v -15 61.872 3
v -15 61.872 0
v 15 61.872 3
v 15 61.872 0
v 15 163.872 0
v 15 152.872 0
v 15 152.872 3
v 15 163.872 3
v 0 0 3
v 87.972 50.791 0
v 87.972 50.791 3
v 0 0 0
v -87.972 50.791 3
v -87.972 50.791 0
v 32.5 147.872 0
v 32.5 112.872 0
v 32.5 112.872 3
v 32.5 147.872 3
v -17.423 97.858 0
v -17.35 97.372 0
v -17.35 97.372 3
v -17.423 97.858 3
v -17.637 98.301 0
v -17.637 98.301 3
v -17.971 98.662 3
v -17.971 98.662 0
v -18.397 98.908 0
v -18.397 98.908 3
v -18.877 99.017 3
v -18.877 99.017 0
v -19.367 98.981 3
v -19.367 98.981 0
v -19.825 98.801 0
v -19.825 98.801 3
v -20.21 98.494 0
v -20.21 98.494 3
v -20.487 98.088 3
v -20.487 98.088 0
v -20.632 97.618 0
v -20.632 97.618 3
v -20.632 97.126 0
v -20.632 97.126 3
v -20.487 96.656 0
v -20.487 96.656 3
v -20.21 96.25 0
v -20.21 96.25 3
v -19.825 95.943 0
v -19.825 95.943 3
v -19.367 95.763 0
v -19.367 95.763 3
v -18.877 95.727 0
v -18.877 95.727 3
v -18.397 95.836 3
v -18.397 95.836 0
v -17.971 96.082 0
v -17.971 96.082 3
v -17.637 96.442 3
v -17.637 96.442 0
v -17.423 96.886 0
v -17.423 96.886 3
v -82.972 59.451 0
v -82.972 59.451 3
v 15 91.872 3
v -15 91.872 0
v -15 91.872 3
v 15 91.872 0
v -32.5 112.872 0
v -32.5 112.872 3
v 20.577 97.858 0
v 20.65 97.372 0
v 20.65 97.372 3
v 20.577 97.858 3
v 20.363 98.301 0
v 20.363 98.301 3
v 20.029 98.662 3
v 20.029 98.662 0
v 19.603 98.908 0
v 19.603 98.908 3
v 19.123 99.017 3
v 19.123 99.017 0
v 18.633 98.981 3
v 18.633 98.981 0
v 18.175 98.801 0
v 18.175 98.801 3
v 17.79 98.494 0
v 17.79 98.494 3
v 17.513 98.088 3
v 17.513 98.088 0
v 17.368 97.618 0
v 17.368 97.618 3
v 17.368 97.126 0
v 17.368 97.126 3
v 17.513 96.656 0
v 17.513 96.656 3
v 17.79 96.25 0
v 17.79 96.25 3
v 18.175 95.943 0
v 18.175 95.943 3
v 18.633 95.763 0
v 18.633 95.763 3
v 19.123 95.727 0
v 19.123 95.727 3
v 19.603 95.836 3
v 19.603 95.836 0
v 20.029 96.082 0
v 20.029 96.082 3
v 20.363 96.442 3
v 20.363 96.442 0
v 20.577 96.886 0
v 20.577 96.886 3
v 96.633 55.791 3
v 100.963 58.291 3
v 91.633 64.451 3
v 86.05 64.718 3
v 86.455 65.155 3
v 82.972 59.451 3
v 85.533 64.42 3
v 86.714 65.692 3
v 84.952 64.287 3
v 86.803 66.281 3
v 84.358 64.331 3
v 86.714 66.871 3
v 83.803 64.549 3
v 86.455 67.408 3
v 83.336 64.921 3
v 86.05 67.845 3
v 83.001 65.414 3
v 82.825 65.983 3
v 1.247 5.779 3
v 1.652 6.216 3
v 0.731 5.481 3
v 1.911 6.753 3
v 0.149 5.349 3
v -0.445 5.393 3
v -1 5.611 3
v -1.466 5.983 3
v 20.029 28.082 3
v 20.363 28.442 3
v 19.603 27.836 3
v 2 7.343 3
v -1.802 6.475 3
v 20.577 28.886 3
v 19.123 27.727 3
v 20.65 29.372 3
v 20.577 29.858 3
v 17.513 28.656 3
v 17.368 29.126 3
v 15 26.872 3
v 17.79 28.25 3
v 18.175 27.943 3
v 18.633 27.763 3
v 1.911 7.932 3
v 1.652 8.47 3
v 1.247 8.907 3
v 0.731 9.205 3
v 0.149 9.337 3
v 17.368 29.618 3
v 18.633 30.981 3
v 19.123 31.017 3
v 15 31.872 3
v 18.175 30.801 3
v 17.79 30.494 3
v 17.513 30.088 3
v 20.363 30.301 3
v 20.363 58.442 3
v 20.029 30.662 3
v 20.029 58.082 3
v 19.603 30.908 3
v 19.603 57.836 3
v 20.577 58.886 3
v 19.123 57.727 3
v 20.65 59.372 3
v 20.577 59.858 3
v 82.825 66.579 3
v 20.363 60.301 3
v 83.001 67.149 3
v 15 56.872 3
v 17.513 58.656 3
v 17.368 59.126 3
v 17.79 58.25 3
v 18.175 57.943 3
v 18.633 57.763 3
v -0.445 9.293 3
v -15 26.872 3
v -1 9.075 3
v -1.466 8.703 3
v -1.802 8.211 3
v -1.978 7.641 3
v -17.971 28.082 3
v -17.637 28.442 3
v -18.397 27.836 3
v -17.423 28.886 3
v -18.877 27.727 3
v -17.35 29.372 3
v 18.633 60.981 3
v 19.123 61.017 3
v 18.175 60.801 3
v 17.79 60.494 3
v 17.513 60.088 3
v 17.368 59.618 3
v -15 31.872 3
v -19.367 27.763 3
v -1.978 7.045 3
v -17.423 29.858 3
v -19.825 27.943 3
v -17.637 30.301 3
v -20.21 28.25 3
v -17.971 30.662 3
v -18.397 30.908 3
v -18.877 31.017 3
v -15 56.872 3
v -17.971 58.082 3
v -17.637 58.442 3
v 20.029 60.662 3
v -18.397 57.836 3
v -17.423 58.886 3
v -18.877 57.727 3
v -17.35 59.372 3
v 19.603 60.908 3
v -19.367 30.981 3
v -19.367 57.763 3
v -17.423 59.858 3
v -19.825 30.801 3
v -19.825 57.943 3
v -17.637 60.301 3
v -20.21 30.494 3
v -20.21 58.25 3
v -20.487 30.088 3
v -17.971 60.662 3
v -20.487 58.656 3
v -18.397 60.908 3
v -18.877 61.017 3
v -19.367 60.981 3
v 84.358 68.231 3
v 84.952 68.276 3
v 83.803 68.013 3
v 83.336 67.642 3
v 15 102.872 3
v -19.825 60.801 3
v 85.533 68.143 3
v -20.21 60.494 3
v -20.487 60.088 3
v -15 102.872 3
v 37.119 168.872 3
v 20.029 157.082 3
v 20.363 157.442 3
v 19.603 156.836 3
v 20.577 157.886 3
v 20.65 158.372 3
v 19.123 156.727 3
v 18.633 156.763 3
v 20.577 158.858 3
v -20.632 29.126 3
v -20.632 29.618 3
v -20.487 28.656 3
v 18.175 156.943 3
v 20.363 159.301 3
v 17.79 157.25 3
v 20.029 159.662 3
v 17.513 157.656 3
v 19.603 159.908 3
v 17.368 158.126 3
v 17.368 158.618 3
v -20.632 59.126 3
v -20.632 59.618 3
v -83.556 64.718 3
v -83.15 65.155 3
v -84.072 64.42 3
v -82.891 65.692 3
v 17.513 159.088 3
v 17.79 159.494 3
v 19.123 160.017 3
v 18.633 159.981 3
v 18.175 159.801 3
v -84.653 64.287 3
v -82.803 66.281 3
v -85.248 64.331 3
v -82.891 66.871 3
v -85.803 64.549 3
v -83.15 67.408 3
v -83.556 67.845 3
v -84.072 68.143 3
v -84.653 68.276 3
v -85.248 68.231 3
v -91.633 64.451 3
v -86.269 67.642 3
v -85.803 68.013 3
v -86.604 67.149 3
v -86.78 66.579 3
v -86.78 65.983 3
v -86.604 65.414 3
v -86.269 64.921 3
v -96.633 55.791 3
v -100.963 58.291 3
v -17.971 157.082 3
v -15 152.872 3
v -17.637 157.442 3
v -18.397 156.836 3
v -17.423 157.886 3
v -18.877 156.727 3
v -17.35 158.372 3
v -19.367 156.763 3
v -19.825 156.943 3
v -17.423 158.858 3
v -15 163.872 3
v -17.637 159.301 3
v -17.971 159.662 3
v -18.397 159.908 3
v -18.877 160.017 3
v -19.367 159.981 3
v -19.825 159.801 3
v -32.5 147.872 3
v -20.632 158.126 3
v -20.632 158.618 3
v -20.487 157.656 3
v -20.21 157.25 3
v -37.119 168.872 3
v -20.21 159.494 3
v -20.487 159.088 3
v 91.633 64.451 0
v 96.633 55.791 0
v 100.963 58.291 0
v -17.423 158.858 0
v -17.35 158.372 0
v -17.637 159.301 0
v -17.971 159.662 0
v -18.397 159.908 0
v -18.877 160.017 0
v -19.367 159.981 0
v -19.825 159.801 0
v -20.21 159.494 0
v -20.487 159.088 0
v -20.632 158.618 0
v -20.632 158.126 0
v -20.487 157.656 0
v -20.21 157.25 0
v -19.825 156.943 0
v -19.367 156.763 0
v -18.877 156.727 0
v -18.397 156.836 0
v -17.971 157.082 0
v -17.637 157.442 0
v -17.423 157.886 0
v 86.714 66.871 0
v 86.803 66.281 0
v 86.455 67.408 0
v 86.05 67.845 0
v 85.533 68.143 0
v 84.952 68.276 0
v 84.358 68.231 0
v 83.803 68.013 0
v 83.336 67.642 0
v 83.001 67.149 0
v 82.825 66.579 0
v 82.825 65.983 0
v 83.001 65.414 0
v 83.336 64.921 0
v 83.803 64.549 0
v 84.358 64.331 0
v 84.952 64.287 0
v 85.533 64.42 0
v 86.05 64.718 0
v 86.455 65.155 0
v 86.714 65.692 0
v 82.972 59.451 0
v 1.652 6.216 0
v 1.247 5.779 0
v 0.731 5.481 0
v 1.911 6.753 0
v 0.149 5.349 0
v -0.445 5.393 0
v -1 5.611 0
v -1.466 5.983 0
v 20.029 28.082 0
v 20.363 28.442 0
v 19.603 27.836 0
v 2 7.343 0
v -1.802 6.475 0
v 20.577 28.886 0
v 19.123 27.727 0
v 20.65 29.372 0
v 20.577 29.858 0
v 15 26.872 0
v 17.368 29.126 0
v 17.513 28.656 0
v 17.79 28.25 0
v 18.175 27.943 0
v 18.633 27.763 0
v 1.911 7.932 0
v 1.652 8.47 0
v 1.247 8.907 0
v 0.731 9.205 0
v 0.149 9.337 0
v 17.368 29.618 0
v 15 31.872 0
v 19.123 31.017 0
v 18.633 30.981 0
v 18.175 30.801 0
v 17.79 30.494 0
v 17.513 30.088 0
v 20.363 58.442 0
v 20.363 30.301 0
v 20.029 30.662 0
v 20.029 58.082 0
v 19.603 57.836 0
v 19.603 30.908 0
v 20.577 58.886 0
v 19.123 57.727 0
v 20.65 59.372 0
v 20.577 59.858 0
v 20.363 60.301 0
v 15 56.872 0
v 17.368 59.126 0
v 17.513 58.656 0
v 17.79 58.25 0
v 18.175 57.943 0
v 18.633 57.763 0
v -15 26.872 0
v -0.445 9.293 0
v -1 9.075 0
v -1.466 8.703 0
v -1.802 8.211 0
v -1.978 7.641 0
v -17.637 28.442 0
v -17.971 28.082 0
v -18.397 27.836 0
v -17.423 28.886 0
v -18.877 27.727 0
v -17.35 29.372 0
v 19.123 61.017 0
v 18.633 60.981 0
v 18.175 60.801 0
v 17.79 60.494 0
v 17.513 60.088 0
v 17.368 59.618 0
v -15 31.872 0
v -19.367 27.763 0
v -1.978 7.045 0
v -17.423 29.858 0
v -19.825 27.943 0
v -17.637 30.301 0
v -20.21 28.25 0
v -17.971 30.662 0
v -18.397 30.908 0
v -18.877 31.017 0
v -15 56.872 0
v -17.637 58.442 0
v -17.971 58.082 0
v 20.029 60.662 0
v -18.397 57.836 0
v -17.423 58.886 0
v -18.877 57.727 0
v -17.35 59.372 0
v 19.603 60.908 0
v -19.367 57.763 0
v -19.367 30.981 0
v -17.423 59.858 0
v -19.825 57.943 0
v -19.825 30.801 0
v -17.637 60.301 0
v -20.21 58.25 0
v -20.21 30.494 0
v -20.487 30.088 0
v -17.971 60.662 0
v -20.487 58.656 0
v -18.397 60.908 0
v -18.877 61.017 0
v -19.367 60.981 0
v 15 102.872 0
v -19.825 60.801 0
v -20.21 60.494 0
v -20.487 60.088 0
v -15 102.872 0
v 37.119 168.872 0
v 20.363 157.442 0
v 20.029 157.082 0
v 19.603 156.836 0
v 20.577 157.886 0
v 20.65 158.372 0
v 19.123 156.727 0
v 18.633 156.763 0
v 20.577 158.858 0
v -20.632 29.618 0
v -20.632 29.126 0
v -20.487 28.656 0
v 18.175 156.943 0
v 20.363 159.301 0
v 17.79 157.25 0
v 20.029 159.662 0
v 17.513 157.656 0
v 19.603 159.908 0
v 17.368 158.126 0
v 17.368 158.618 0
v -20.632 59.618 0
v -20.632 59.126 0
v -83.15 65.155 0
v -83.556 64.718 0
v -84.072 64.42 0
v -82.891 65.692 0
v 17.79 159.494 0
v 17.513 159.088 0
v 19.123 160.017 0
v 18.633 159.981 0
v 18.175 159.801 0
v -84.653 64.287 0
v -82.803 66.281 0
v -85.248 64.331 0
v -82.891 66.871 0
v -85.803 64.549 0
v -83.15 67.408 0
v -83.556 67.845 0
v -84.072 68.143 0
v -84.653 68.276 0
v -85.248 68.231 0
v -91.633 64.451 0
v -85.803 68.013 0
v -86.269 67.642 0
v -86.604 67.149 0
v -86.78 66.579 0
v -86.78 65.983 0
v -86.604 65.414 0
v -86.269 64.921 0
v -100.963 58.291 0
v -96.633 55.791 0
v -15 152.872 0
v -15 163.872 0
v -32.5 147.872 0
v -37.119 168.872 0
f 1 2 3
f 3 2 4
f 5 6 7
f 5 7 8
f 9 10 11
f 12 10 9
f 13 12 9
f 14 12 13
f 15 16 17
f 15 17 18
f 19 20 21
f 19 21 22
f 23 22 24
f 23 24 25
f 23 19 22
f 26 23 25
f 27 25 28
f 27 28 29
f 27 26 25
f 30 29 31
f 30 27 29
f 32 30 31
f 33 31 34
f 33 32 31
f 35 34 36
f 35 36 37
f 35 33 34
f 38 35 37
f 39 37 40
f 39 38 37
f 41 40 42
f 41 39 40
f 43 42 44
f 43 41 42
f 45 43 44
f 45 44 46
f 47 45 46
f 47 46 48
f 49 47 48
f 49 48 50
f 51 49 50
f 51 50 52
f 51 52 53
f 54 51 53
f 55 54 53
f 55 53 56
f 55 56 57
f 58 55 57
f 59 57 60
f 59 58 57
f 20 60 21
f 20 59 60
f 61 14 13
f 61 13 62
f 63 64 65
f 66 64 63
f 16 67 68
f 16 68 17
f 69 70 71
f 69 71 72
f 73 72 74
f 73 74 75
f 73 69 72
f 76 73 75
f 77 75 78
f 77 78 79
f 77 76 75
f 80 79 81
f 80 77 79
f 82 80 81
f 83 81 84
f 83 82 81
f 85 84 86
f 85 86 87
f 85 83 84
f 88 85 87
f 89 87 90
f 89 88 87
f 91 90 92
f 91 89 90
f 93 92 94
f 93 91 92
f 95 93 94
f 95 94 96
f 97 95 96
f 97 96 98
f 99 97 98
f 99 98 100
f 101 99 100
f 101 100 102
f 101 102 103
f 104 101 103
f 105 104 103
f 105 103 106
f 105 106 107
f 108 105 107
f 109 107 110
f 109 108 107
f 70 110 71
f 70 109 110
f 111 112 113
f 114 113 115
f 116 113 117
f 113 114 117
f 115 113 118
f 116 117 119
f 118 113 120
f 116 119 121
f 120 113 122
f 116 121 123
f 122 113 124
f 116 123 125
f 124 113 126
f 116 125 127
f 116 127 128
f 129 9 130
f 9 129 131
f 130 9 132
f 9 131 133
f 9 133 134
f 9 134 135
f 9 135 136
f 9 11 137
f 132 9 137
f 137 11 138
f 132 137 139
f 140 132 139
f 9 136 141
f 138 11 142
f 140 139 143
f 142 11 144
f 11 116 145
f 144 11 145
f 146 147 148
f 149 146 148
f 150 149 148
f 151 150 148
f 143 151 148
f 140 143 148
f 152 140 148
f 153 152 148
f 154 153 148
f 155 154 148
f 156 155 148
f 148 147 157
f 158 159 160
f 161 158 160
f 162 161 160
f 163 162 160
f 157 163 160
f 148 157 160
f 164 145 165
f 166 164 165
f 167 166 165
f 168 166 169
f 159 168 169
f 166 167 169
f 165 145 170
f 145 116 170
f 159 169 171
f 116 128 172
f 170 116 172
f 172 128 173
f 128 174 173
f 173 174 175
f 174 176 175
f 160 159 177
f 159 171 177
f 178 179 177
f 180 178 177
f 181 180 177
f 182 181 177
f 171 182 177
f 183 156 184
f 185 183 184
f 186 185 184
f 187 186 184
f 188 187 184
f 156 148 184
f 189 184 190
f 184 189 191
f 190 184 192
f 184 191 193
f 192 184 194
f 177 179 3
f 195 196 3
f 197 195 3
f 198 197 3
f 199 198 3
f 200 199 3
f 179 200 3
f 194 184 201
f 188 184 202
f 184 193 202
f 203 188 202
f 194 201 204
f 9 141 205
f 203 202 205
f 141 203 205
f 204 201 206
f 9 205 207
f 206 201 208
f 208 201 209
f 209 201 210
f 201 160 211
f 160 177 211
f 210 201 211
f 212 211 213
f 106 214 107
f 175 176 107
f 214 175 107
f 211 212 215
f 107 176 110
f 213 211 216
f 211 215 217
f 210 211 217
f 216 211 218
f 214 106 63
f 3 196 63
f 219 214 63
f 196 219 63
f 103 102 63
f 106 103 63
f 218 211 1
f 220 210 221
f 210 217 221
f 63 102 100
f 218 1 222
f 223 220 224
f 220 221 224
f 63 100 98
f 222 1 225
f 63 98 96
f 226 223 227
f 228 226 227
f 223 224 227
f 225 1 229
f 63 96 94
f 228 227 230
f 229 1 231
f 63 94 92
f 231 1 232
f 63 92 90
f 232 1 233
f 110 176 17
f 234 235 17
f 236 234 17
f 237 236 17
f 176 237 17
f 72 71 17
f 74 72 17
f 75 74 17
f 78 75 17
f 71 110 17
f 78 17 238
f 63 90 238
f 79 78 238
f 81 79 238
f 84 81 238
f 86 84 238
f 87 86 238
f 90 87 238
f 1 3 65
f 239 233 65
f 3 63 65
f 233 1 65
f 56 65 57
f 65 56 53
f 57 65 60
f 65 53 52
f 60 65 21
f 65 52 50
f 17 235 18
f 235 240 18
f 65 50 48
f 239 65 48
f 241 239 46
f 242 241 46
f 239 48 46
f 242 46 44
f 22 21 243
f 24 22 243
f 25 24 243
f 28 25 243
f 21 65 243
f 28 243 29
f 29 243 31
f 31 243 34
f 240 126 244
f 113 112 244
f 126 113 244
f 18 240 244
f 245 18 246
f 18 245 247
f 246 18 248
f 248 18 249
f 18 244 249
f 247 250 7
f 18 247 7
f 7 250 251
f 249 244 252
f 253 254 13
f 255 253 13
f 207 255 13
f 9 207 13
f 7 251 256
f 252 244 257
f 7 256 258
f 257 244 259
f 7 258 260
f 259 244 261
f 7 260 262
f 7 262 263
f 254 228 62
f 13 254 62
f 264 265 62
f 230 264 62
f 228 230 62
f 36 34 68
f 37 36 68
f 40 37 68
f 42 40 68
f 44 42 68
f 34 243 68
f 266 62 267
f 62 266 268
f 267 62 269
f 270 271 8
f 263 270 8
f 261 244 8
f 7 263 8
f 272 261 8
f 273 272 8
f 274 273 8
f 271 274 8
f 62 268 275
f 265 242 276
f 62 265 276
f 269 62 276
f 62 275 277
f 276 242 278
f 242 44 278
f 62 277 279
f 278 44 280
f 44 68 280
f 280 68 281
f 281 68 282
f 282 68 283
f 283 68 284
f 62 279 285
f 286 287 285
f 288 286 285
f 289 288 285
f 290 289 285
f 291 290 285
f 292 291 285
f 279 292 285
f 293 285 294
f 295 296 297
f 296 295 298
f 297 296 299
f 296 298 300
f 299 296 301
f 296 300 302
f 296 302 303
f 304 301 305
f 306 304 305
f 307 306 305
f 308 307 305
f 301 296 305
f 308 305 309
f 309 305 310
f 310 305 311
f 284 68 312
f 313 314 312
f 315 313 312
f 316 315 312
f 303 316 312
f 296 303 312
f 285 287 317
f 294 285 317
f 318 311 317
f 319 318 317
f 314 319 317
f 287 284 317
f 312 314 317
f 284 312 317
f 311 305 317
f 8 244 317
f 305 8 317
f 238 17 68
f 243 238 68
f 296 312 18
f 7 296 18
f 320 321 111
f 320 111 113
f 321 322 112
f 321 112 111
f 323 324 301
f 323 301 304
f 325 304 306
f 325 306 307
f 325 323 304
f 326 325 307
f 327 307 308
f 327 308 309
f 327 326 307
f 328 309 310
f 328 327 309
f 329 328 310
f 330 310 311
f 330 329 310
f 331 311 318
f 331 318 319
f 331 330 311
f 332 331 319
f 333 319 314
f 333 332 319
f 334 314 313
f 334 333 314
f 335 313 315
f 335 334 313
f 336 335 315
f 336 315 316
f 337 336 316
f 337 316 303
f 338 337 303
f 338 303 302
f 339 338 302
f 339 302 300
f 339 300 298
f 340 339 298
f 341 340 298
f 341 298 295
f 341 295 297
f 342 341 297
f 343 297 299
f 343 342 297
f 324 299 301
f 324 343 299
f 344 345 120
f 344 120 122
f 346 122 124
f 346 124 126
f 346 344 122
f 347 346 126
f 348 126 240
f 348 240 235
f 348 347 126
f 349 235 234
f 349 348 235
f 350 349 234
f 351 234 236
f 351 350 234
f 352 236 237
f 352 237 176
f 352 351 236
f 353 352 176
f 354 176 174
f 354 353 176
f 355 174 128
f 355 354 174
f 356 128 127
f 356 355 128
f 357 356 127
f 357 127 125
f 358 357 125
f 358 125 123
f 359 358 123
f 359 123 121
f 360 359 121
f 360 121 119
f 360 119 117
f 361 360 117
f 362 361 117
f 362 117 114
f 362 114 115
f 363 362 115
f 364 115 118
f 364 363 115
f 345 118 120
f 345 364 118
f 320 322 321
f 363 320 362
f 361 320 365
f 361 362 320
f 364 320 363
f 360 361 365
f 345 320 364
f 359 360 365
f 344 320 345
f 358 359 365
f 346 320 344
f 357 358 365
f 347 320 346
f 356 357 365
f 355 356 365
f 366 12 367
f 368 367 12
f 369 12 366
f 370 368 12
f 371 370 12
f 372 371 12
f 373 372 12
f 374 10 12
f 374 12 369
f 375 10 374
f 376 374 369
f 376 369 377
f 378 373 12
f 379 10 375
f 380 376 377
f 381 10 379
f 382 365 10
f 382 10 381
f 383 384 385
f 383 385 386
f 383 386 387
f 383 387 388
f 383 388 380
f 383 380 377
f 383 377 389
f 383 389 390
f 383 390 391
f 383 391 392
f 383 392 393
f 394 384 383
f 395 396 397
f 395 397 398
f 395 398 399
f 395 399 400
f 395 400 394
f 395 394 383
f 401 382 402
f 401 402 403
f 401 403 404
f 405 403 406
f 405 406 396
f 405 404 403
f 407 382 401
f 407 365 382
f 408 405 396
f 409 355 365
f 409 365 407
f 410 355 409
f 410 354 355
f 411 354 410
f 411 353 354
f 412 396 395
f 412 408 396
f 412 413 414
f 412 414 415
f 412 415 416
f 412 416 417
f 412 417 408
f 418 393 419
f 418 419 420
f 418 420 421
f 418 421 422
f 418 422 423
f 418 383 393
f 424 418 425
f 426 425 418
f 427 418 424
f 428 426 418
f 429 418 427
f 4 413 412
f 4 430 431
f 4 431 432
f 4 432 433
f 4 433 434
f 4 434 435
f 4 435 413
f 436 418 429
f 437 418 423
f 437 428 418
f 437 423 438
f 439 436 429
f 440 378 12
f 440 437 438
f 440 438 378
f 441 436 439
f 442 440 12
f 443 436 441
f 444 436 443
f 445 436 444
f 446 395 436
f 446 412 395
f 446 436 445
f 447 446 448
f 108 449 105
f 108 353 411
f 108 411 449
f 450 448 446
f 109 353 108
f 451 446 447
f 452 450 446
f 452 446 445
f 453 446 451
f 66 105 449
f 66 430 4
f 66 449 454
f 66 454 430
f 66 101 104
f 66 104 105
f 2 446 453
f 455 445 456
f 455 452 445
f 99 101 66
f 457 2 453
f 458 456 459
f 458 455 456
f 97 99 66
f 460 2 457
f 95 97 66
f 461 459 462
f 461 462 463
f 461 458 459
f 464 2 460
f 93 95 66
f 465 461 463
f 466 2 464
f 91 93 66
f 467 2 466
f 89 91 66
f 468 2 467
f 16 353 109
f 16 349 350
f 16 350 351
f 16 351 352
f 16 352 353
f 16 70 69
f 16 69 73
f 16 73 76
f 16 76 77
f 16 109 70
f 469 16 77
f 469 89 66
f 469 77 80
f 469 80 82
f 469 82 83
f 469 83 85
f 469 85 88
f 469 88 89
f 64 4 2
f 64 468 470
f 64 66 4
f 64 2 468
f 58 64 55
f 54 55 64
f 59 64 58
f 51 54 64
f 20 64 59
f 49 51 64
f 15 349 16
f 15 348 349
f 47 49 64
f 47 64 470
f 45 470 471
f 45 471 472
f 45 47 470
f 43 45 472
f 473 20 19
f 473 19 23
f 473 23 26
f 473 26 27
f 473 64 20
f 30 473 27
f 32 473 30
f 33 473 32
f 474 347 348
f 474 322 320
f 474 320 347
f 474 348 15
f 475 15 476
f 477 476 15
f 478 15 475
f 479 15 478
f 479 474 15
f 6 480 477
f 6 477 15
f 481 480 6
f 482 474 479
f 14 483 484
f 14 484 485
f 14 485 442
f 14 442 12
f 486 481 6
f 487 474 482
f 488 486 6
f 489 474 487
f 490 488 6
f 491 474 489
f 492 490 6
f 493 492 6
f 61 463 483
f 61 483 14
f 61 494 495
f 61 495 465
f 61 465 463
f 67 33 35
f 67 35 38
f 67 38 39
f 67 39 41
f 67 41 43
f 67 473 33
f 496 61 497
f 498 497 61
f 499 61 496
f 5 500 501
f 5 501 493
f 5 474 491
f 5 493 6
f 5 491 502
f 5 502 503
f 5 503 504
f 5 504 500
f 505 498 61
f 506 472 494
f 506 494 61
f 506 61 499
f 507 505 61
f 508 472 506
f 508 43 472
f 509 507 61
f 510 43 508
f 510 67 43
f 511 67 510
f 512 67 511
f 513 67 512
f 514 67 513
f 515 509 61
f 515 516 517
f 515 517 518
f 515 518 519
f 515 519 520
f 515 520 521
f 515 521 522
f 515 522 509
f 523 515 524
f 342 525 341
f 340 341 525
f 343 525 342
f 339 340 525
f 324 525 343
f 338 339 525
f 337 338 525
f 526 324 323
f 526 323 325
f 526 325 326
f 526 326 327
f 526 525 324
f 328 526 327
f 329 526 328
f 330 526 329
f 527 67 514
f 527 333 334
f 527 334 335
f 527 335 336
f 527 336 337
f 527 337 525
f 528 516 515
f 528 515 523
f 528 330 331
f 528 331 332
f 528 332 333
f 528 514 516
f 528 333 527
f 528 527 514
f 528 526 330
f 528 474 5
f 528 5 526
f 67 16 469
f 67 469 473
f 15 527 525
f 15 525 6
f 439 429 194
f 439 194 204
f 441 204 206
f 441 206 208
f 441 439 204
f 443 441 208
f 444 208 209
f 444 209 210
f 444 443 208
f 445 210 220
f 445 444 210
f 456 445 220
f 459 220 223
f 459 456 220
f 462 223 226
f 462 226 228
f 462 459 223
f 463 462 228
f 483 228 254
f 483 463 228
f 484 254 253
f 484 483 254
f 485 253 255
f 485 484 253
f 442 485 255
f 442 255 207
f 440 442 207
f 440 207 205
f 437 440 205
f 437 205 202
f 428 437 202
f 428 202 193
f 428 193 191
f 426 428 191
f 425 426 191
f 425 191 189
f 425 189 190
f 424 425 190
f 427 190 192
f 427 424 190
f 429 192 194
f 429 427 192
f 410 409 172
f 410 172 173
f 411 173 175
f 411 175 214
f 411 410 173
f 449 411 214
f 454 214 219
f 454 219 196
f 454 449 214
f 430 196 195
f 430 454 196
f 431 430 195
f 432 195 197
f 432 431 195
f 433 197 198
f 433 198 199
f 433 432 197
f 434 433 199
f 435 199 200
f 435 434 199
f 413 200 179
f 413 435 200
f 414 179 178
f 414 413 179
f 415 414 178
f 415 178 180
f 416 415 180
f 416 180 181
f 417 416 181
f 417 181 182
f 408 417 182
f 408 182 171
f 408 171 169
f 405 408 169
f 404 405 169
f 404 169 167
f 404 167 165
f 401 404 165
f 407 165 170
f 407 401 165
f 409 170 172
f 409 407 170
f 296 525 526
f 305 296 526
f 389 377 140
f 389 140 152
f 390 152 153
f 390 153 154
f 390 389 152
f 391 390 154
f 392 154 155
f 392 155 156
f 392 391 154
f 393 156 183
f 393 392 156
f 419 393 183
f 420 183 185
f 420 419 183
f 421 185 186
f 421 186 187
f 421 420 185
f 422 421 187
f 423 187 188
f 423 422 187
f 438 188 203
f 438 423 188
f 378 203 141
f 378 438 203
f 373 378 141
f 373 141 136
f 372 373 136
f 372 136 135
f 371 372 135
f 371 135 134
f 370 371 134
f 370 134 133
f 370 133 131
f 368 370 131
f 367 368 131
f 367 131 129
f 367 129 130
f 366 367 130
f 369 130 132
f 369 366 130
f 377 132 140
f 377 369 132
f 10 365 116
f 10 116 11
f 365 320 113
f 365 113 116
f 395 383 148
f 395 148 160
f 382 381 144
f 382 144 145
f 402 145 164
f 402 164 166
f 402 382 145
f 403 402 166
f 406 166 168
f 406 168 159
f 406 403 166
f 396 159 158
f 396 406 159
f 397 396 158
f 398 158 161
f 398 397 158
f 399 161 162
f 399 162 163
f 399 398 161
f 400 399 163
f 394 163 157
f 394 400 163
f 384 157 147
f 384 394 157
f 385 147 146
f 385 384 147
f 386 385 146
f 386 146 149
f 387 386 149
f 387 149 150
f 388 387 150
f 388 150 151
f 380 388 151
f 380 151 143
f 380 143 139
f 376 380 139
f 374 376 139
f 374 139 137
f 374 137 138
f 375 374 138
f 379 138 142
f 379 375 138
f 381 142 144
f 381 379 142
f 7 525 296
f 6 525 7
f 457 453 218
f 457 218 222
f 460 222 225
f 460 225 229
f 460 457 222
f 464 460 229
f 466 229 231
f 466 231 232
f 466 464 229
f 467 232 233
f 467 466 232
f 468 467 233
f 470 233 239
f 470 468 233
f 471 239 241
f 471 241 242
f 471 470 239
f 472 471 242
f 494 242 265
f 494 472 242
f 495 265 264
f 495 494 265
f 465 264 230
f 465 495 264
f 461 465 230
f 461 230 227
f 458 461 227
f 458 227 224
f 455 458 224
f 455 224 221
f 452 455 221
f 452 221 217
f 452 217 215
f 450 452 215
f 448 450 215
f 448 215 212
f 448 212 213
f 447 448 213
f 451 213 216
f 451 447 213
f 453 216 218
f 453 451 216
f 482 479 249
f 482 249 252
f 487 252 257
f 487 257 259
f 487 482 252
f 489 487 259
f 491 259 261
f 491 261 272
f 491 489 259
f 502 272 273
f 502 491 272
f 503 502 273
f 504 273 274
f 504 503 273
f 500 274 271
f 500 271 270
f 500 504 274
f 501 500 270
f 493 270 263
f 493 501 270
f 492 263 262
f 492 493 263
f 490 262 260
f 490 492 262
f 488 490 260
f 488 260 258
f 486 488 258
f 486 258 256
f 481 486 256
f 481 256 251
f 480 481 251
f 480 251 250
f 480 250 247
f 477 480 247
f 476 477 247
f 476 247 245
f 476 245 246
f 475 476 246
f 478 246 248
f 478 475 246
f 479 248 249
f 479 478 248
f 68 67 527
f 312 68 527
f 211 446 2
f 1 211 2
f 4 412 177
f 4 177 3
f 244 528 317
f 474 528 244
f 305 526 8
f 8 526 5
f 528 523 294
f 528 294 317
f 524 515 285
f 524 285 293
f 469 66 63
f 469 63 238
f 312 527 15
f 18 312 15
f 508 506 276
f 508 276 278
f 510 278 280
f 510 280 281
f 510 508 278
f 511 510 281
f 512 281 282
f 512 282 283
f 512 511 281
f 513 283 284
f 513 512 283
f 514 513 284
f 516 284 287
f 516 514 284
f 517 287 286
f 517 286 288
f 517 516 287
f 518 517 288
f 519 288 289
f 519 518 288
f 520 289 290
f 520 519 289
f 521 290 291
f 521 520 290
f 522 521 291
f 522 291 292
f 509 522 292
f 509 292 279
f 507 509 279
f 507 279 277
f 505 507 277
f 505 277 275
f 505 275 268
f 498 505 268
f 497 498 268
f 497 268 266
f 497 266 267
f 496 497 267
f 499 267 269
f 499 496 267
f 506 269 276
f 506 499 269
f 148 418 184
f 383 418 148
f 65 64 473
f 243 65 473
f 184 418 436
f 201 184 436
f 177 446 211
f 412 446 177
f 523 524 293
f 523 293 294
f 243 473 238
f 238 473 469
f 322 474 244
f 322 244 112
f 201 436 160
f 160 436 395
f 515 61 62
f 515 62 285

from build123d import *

# Parameters (mm, degrees)
ESQUISSE1_R        = 2
ESQUISSE1_R_2      = 1.65
ESQUISSE1_W        = 65
ESQUISSE1_H        = 35
ESQUISSE1_W_2      = 30
ESQUISSE1_H_2      = 5
ESQUISSE1_H_3      = 11
BOSS_EXTRU_1_DEPTH = 3


with BuildPart() as part:
    # Esquisse1 → Boss.-Extru.1 (new body)
    with BuildSketch(Plane.XY):
        Polygon((37.118802154, 168.871977627), (100.962812921, 58.290907218), (96.632685902, 55.790907218), (91.632685902, 64.451161256), (82.972431864, 59.451161256), (87.972431864, 50.790907218), (0, 0), (-87.972431864, 50.790907218), (-82.972431864, 59.451161256), (-91.632685902, 64.451161256), (-96.632685902, 55.790907218), (-100.962812921, 58.290907218), (-37.118802153, 168.871977627), align=None)
        with Locations((-84.802558883, 66.281288275)):
            Circle(ESQUISSE1_R, mode=Mode.SUBTRACT)
        with Locations((84.802558883, 66.281288275)):
            Circle(ESQUISSE1_R, mode=Mode.SUBTRACT)
        with Locations((-19, 97.371977627)):
            Circle(ESQUISSE1_R_2, mode=Mode.SUBTRACT)
        with Locations((19, 97.371977627)):
            Circle(ESQUISSE1_R_2, mode=Mode.SUBTRACT)
        with Locations((19, 158.371977627)):
            Circle(ESQUISSE1_R_2, mode=Mode.SUBTRACT)
        with Locations((-19, 158.371977627)):
            Circle(ESQUISSE1_R_2, mode=Mode.SUBTRACT)
        with Locations((-19, 59.371977627)):
            Circle(ESQUISSE1_R_2, mode=Mode.SUBTRACT)
        with Locations((0, 7.342924489)):
            Circle(ESQUISSE1_R, mode=Mode.SUBTRACT)
        with Locations((19, 59.371977627)):
            Circle(ESQUISSE1_R_2, mode=Mode.SUBTRACT)
        with Locations((19, 29.371977627)):
            Circle(ESQUISSE1_R_2, mode=Mode.SUBTRACT)
        with Locations((-19, 29.371977627)):
            Circle(ESQUISSE1_R_2, mode=Mode.SUBTRACT)
        with Locations((0, 130.371977627)):
            Rectangle(ESQUISSE1_W, ESQUISSE1_H, mode=Mode.SUBTRACT)
        with Locations((0, 59.371977627)):
            Rectangle(ESQUISSE1_W_2, ESQUISSE1_H_2, mode=Mode.SUBTRACT)
        with Locations((0, 29.371977627)):
            Rectangle(ESQUISSE1_W_2, ESQUISSE1_H_2, mode=Mode.SUBTRACT)
        with Locations((0, 97.371977627)):
            Rectangle(ESQUISSE1_W_2, ESQUISSE1_H_3, mode=Mode.SUBTRACT)
        with Locations((0, 158.371977627)):
            Rectangle(ESQUISSE1_W_2, ESQUISSE1_H_3, mode=Mode.SUBTRACT)
    extrude(amount=BOSS_EXTRU_1_DEPTH)


solid = part.part
